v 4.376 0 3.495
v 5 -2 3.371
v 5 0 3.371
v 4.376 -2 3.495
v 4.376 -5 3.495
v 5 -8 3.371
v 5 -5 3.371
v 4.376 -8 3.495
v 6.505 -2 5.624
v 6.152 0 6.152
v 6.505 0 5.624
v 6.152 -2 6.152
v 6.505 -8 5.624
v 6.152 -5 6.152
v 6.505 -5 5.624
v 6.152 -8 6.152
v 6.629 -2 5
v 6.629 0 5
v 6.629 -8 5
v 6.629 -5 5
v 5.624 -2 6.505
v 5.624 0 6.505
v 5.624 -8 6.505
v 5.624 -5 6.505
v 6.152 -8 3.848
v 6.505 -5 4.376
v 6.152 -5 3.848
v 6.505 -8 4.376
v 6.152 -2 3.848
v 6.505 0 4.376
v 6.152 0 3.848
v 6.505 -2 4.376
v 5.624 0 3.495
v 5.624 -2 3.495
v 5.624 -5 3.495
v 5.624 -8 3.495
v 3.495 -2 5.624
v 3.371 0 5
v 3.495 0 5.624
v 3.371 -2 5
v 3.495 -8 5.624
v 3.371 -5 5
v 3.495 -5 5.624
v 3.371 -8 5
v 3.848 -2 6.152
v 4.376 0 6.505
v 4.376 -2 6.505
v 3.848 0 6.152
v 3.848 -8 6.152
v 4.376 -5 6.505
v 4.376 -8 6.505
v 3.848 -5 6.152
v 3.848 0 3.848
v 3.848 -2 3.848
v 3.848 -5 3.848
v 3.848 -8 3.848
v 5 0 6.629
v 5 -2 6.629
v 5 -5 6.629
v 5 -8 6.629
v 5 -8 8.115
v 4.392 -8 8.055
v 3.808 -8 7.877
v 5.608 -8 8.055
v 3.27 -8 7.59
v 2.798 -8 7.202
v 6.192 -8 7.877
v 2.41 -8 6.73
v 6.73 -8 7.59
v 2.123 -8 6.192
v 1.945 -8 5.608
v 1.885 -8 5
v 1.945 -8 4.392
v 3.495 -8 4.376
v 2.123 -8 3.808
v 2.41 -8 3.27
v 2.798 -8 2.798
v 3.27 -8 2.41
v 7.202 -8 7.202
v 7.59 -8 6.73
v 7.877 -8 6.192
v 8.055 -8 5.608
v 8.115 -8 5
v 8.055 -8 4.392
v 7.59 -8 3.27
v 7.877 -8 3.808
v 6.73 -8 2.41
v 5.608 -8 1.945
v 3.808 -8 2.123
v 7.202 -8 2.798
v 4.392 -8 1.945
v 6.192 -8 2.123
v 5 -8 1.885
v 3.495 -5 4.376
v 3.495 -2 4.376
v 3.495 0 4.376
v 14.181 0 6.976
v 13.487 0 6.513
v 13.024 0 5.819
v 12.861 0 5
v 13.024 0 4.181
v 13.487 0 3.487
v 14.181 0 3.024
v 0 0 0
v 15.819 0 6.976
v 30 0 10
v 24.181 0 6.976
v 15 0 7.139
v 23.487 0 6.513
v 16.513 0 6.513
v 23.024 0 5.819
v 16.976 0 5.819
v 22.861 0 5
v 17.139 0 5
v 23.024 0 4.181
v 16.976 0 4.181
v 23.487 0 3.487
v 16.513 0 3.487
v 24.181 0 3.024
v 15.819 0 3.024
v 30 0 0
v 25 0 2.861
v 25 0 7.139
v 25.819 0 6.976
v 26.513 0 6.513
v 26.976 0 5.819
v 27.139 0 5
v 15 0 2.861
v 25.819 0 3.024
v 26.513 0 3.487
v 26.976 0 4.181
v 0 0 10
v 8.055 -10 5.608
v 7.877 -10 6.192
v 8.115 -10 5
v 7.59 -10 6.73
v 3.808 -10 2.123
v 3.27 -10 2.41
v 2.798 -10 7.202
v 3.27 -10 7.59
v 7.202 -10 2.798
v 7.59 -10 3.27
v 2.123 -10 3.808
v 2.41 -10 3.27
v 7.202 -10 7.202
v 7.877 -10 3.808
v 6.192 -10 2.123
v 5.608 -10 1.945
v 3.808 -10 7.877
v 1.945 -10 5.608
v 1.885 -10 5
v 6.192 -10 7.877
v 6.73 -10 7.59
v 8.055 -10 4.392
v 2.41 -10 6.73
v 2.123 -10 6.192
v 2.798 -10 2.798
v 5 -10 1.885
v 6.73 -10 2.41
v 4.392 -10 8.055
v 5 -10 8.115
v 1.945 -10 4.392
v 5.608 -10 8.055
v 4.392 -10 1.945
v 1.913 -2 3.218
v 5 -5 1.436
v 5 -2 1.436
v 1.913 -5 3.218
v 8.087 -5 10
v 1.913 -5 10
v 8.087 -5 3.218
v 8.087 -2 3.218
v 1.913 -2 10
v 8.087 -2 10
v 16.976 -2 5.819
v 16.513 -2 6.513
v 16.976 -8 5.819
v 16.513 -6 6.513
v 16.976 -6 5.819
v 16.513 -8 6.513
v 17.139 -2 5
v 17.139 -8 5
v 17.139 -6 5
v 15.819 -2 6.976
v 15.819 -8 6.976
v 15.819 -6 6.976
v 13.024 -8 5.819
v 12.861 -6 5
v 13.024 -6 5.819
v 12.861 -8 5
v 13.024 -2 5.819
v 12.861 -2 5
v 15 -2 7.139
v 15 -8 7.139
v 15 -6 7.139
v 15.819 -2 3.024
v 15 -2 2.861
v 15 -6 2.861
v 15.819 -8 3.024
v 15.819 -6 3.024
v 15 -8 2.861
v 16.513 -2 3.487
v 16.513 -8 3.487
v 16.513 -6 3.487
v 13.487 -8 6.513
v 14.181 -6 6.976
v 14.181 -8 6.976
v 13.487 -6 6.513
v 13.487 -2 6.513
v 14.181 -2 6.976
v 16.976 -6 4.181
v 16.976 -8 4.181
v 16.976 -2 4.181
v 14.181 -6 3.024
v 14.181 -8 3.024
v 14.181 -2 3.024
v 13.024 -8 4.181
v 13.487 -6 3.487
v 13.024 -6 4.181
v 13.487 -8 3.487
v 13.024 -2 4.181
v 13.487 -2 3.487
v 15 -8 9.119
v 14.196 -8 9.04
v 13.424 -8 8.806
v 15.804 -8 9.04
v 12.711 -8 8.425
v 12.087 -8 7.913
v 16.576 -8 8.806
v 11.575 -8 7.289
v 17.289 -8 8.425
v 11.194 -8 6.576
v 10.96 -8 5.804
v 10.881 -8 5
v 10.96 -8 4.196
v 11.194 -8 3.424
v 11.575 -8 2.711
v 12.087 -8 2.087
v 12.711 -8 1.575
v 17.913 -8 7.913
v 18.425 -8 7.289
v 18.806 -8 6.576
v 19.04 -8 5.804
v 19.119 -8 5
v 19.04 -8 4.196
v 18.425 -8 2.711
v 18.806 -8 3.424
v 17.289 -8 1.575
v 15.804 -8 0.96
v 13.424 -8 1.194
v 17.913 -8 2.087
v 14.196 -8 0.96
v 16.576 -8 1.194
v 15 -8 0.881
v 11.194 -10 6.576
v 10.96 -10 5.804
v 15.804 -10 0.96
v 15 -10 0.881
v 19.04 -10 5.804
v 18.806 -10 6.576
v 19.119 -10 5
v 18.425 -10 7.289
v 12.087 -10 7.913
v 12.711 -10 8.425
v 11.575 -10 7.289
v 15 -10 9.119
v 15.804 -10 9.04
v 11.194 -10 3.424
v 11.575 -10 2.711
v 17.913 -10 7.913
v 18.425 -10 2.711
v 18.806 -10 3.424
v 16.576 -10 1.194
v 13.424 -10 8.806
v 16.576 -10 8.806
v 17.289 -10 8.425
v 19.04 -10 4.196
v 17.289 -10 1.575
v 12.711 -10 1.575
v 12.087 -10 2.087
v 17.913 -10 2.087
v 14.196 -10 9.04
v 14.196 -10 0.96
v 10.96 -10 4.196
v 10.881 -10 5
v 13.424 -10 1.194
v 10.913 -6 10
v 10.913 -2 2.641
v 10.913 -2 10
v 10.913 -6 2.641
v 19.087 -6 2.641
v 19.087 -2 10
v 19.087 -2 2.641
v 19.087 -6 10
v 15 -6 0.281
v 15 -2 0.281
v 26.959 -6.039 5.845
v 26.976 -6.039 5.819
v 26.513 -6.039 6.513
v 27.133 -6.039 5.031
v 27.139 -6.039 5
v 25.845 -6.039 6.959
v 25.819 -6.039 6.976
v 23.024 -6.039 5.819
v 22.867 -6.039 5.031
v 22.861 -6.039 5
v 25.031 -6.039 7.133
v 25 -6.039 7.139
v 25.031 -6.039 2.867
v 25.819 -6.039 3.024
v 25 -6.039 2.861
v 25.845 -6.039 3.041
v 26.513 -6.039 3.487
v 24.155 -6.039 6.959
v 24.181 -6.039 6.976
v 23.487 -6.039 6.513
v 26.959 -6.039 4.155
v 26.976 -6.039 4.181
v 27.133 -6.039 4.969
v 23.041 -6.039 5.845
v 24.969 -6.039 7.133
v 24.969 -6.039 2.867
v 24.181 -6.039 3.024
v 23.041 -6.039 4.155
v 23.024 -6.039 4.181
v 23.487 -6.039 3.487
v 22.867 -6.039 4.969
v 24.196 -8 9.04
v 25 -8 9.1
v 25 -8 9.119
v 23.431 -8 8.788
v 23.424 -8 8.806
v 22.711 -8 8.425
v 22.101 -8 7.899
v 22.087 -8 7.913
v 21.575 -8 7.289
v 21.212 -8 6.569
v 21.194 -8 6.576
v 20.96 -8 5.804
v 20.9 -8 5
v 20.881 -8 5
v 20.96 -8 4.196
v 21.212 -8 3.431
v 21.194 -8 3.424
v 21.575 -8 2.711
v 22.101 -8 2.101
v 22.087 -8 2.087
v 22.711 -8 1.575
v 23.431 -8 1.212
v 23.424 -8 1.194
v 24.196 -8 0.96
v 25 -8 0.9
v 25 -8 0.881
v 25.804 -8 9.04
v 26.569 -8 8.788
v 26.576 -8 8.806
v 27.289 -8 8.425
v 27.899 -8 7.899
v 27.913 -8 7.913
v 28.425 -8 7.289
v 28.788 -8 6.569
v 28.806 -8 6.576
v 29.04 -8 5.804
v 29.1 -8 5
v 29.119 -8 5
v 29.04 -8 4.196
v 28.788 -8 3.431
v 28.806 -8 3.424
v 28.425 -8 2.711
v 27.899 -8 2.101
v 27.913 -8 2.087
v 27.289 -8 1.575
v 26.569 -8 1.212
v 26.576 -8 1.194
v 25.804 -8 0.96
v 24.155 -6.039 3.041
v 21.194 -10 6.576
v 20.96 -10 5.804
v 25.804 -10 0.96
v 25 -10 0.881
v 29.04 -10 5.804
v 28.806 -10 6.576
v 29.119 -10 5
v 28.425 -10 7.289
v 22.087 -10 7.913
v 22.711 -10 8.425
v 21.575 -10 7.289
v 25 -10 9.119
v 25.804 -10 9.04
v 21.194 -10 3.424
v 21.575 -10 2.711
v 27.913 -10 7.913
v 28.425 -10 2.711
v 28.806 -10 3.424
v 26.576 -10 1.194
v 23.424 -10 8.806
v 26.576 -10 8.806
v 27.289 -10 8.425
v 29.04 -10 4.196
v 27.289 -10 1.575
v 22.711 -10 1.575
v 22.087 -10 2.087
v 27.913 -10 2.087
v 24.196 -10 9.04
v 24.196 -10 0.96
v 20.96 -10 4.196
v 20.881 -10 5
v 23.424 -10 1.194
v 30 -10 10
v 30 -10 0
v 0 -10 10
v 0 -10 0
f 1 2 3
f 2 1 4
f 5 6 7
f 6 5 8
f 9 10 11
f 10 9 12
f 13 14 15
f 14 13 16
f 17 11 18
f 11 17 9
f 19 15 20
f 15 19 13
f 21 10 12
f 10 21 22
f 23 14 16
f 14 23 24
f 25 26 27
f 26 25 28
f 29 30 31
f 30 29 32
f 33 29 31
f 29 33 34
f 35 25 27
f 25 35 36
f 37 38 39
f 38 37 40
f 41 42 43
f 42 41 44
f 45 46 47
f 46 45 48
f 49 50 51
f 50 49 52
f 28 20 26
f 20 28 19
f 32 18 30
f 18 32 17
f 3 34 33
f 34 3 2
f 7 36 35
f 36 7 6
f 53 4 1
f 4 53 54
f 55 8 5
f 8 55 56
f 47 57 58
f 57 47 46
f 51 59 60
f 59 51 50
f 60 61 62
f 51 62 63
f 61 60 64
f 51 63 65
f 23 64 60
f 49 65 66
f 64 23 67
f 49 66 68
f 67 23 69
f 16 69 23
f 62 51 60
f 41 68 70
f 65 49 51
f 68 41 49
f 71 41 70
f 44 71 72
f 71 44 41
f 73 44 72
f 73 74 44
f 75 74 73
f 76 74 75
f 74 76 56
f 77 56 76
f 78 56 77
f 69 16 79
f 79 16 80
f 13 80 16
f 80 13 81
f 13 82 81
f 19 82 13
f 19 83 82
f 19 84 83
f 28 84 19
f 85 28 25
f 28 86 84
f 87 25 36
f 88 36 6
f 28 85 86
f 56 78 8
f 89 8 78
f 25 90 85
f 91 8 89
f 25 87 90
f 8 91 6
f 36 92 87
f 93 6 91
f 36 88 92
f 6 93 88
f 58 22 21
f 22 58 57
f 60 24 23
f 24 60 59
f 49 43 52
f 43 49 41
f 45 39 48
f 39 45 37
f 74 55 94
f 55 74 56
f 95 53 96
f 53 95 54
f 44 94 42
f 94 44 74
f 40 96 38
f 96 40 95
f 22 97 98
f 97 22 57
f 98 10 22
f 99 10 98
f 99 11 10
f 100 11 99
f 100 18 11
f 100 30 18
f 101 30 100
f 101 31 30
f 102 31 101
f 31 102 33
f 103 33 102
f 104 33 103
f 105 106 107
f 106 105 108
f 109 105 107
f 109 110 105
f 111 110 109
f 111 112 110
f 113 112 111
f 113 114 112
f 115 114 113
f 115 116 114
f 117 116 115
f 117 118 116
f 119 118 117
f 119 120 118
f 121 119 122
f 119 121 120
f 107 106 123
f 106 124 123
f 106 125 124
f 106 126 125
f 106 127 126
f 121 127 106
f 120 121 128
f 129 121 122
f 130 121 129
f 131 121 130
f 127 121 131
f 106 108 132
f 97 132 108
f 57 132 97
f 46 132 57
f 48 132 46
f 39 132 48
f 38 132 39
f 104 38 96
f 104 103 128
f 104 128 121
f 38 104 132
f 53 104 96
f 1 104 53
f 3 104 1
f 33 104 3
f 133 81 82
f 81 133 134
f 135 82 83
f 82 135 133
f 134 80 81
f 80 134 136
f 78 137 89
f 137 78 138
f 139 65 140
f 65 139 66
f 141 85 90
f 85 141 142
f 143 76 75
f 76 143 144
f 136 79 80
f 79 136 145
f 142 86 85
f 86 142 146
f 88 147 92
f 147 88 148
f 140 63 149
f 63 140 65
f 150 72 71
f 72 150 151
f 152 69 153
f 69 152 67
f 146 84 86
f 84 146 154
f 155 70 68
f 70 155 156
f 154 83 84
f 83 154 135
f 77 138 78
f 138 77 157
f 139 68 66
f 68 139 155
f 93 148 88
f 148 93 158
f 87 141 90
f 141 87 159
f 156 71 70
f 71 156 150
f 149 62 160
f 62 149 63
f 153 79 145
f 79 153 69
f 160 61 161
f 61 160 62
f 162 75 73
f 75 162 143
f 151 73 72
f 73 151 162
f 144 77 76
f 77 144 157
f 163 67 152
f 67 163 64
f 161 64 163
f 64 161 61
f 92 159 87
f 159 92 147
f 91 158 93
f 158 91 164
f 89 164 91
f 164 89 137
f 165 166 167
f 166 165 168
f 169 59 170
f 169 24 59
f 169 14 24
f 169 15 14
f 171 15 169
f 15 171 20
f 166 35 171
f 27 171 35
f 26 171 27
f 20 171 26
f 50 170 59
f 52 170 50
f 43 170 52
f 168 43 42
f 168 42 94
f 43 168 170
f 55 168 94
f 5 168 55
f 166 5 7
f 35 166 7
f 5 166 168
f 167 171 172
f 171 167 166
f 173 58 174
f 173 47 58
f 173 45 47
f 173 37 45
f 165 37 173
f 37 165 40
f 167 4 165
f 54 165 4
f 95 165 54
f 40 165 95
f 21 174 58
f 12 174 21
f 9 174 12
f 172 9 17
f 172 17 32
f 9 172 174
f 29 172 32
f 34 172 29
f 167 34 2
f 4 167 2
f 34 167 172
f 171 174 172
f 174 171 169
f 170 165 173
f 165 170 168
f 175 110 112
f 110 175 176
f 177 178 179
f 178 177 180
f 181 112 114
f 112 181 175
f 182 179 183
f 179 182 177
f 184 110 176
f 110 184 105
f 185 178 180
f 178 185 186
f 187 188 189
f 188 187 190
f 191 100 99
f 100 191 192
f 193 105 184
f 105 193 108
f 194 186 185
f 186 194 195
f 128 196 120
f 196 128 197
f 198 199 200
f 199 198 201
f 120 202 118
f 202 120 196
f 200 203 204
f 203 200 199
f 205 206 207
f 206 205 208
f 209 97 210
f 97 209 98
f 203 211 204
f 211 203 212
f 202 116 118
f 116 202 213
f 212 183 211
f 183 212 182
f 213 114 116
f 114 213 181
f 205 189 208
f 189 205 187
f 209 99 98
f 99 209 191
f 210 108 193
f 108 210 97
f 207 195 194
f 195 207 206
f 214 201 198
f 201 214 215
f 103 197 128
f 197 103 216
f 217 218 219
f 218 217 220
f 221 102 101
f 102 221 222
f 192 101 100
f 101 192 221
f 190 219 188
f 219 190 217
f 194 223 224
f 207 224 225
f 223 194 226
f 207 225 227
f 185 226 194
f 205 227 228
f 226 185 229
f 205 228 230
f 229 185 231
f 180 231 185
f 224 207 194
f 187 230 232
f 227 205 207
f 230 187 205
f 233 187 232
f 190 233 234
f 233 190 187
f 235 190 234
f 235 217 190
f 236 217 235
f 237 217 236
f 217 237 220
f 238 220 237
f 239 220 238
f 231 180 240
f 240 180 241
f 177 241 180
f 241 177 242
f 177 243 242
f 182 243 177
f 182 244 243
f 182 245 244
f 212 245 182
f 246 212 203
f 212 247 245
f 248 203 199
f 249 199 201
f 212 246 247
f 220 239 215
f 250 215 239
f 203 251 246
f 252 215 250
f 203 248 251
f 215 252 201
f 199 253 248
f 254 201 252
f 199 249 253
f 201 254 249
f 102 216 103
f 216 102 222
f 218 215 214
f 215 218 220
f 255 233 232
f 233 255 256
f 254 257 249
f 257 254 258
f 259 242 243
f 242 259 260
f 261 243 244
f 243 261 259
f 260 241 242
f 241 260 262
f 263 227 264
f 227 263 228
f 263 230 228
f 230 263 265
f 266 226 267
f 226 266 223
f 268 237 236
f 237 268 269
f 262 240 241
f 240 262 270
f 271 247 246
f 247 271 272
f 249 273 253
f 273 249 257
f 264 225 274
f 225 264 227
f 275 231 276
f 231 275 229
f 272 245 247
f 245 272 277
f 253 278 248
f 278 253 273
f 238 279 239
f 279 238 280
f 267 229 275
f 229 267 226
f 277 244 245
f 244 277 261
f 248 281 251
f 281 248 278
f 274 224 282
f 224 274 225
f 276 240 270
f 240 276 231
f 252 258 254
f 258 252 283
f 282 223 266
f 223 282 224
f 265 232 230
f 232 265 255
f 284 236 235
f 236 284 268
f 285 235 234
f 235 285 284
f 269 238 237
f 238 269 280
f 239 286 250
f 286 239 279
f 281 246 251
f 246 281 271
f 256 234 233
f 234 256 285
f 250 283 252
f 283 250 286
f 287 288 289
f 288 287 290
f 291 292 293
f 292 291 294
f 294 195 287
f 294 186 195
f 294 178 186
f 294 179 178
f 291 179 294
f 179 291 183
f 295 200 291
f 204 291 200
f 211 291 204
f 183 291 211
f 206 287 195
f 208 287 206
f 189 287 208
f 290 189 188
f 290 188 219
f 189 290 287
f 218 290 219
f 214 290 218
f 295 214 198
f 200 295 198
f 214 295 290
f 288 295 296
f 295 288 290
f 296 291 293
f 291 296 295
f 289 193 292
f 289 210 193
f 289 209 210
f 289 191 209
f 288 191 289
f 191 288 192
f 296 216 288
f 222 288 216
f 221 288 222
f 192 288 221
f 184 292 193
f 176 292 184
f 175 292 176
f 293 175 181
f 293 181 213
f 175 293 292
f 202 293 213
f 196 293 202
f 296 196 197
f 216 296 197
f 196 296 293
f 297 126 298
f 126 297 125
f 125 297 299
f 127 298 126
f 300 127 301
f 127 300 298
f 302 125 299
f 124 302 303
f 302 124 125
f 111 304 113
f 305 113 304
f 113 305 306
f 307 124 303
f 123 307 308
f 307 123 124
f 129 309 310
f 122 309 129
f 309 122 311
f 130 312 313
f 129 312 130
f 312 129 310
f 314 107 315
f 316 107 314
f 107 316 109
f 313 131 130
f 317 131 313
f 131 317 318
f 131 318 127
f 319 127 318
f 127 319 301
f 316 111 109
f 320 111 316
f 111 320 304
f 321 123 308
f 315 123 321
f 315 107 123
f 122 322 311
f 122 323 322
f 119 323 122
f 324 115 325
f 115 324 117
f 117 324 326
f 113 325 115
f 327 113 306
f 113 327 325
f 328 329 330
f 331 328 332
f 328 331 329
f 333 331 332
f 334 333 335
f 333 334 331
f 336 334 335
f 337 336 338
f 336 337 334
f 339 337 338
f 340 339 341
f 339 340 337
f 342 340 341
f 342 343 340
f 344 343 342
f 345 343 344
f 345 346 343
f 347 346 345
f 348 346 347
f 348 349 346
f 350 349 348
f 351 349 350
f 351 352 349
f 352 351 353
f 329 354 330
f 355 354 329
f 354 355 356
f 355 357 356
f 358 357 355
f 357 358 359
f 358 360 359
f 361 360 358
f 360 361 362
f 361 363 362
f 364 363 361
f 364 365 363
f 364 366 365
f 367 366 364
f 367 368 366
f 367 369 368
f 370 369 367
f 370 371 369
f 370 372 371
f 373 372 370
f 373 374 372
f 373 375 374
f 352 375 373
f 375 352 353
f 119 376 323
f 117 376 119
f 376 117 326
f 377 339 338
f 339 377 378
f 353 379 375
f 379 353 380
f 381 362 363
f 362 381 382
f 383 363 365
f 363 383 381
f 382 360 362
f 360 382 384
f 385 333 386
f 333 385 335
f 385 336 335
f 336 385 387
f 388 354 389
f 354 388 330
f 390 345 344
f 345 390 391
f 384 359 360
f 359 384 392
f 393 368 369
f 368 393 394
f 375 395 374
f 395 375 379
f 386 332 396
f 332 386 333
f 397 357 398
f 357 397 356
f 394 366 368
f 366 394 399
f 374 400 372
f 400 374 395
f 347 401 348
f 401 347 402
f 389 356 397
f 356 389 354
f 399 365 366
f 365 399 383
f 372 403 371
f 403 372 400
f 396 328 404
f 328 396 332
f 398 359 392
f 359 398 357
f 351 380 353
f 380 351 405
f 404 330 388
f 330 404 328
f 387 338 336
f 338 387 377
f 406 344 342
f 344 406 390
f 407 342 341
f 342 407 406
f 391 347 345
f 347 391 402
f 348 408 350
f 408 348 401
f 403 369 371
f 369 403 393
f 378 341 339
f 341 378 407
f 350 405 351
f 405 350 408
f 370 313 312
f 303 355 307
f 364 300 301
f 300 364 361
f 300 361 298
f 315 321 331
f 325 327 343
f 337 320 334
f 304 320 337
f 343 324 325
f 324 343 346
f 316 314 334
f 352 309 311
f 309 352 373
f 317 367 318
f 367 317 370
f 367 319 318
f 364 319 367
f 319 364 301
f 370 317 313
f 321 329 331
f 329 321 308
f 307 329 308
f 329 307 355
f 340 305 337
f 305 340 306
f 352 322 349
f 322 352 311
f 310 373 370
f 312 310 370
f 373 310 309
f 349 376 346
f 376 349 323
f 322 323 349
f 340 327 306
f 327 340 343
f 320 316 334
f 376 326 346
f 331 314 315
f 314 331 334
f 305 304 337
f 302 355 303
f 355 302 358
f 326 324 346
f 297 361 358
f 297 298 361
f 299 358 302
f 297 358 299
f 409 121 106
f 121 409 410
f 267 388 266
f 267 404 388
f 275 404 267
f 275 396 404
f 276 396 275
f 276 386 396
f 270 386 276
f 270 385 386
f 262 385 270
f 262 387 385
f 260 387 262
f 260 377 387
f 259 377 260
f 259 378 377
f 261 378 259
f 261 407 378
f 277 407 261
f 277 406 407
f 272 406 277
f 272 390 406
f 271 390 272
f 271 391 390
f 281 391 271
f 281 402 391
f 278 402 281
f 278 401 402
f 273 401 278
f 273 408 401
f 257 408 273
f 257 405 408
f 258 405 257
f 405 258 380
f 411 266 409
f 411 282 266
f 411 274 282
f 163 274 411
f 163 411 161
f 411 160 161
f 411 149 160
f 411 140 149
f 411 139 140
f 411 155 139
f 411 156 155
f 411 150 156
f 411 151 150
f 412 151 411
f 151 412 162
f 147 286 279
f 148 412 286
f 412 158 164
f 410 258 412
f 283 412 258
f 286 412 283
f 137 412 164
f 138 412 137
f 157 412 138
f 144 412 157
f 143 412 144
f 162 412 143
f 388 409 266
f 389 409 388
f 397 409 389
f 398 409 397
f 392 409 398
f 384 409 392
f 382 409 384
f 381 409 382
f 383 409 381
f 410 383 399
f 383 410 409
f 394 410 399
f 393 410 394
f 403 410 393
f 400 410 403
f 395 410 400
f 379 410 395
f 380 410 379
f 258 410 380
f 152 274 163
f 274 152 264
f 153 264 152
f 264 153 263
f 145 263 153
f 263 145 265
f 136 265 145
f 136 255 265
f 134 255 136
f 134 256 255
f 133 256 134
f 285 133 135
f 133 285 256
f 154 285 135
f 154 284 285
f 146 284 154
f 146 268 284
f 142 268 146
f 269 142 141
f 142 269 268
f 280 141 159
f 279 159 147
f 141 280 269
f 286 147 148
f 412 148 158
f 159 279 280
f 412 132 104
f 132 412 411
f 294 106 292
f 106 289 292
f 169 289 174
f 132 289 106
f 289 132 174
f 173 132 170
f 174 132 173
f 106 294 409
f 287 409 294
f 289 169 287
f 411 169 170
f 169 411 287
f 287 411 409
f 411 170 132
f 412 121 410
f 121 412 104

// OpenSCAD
$radial_error = 0.1;
$fn = 16;

module cylinder_outer(height, radius, fn=$fn) {
	fudge = 1/cos(180/fn);
	cylinder(h=height,r=radius*fudge+$radial_error, $fn=fn);
}

module cylinder_inner(height, radius, fn=$fn) {
	cylinder(h=height,r=radius-$radial_error,$fn=fn);
}

// Make a hole for a bolt/screw combination.
module bolt(diameter=3, depth=8, nut_offset=2, shaft_length=10, inset=10) {
	hole(diameter, depth, inset);
	hull() {
		shaft_width = diameter;
		translate([0, 0, nut_offset]) rotate(360/12, [0, 0, 1]) cylinder_outer(diameter, shaft_width, 6);
		translate([0, shaft_length, nut_offset]) rotate(360/12, [0, 0, 1]) cylinder_outer(diameter, shaft_width, 6);
	}
}

// Make a hole. The diameter is the size of the screw (e.g. 3 for M3). Depth is how far the hole should go for the thread, and inset is how far out there should be a hole for the head to go.
module hole(diameter=3, depth=6, inset=10) {
	cylinder_outer(depth, diameter/2);
	translate([0, 0, depth]) cylinder_outer(inset, diameter, 32);
}

module countersunk_hole(diameter=3, depth=6, inset=10) {
	hole(diameter, depth, inset);
	translate([0, 0, depth-diameter/2]) cylinder(r1=diameter/2+$radial_error, r2=diameter+$radial_error, h=diameter/2);
}

module countersunk_bolt(diameter=3, depth=8, nut_offset=2, shaft_length=10, inset=10) {
	countersunk_hole(diameter, depth, inset);
	hull() {
		shaft_width = diameter;
		translate([0, 0, nut_offset]) rotate(360/12, [0, 0, 1]) cylinder_outer(diameter, shaft_width, 6);
		translate([0, shaft_length, nut_offset]) rotate(360/12, [0, 0, 1]) cylinder_outer(diameter, shaft_width, 6);
	}
}

module mounting_hole(diameter=3, depth=6, inset=10, outset=3) {
	difference() {
		cylinder_outer(depth, diameter/2+outset);
		hole(diameter=diameter, depth=depth, inset=inset);
	}
}

rotate(90, [1, 0, 0]) difference() {
	cube([30, 10, 10]);
	translate([5, 5, 0]) bolt(diameter=3, depth=8);
	translate([15, 5, 0]) bolt(diameter=4, depth=8);
	translate([25, 5, 0]) countersunk_hole(diameter=4, depth=8);
}
